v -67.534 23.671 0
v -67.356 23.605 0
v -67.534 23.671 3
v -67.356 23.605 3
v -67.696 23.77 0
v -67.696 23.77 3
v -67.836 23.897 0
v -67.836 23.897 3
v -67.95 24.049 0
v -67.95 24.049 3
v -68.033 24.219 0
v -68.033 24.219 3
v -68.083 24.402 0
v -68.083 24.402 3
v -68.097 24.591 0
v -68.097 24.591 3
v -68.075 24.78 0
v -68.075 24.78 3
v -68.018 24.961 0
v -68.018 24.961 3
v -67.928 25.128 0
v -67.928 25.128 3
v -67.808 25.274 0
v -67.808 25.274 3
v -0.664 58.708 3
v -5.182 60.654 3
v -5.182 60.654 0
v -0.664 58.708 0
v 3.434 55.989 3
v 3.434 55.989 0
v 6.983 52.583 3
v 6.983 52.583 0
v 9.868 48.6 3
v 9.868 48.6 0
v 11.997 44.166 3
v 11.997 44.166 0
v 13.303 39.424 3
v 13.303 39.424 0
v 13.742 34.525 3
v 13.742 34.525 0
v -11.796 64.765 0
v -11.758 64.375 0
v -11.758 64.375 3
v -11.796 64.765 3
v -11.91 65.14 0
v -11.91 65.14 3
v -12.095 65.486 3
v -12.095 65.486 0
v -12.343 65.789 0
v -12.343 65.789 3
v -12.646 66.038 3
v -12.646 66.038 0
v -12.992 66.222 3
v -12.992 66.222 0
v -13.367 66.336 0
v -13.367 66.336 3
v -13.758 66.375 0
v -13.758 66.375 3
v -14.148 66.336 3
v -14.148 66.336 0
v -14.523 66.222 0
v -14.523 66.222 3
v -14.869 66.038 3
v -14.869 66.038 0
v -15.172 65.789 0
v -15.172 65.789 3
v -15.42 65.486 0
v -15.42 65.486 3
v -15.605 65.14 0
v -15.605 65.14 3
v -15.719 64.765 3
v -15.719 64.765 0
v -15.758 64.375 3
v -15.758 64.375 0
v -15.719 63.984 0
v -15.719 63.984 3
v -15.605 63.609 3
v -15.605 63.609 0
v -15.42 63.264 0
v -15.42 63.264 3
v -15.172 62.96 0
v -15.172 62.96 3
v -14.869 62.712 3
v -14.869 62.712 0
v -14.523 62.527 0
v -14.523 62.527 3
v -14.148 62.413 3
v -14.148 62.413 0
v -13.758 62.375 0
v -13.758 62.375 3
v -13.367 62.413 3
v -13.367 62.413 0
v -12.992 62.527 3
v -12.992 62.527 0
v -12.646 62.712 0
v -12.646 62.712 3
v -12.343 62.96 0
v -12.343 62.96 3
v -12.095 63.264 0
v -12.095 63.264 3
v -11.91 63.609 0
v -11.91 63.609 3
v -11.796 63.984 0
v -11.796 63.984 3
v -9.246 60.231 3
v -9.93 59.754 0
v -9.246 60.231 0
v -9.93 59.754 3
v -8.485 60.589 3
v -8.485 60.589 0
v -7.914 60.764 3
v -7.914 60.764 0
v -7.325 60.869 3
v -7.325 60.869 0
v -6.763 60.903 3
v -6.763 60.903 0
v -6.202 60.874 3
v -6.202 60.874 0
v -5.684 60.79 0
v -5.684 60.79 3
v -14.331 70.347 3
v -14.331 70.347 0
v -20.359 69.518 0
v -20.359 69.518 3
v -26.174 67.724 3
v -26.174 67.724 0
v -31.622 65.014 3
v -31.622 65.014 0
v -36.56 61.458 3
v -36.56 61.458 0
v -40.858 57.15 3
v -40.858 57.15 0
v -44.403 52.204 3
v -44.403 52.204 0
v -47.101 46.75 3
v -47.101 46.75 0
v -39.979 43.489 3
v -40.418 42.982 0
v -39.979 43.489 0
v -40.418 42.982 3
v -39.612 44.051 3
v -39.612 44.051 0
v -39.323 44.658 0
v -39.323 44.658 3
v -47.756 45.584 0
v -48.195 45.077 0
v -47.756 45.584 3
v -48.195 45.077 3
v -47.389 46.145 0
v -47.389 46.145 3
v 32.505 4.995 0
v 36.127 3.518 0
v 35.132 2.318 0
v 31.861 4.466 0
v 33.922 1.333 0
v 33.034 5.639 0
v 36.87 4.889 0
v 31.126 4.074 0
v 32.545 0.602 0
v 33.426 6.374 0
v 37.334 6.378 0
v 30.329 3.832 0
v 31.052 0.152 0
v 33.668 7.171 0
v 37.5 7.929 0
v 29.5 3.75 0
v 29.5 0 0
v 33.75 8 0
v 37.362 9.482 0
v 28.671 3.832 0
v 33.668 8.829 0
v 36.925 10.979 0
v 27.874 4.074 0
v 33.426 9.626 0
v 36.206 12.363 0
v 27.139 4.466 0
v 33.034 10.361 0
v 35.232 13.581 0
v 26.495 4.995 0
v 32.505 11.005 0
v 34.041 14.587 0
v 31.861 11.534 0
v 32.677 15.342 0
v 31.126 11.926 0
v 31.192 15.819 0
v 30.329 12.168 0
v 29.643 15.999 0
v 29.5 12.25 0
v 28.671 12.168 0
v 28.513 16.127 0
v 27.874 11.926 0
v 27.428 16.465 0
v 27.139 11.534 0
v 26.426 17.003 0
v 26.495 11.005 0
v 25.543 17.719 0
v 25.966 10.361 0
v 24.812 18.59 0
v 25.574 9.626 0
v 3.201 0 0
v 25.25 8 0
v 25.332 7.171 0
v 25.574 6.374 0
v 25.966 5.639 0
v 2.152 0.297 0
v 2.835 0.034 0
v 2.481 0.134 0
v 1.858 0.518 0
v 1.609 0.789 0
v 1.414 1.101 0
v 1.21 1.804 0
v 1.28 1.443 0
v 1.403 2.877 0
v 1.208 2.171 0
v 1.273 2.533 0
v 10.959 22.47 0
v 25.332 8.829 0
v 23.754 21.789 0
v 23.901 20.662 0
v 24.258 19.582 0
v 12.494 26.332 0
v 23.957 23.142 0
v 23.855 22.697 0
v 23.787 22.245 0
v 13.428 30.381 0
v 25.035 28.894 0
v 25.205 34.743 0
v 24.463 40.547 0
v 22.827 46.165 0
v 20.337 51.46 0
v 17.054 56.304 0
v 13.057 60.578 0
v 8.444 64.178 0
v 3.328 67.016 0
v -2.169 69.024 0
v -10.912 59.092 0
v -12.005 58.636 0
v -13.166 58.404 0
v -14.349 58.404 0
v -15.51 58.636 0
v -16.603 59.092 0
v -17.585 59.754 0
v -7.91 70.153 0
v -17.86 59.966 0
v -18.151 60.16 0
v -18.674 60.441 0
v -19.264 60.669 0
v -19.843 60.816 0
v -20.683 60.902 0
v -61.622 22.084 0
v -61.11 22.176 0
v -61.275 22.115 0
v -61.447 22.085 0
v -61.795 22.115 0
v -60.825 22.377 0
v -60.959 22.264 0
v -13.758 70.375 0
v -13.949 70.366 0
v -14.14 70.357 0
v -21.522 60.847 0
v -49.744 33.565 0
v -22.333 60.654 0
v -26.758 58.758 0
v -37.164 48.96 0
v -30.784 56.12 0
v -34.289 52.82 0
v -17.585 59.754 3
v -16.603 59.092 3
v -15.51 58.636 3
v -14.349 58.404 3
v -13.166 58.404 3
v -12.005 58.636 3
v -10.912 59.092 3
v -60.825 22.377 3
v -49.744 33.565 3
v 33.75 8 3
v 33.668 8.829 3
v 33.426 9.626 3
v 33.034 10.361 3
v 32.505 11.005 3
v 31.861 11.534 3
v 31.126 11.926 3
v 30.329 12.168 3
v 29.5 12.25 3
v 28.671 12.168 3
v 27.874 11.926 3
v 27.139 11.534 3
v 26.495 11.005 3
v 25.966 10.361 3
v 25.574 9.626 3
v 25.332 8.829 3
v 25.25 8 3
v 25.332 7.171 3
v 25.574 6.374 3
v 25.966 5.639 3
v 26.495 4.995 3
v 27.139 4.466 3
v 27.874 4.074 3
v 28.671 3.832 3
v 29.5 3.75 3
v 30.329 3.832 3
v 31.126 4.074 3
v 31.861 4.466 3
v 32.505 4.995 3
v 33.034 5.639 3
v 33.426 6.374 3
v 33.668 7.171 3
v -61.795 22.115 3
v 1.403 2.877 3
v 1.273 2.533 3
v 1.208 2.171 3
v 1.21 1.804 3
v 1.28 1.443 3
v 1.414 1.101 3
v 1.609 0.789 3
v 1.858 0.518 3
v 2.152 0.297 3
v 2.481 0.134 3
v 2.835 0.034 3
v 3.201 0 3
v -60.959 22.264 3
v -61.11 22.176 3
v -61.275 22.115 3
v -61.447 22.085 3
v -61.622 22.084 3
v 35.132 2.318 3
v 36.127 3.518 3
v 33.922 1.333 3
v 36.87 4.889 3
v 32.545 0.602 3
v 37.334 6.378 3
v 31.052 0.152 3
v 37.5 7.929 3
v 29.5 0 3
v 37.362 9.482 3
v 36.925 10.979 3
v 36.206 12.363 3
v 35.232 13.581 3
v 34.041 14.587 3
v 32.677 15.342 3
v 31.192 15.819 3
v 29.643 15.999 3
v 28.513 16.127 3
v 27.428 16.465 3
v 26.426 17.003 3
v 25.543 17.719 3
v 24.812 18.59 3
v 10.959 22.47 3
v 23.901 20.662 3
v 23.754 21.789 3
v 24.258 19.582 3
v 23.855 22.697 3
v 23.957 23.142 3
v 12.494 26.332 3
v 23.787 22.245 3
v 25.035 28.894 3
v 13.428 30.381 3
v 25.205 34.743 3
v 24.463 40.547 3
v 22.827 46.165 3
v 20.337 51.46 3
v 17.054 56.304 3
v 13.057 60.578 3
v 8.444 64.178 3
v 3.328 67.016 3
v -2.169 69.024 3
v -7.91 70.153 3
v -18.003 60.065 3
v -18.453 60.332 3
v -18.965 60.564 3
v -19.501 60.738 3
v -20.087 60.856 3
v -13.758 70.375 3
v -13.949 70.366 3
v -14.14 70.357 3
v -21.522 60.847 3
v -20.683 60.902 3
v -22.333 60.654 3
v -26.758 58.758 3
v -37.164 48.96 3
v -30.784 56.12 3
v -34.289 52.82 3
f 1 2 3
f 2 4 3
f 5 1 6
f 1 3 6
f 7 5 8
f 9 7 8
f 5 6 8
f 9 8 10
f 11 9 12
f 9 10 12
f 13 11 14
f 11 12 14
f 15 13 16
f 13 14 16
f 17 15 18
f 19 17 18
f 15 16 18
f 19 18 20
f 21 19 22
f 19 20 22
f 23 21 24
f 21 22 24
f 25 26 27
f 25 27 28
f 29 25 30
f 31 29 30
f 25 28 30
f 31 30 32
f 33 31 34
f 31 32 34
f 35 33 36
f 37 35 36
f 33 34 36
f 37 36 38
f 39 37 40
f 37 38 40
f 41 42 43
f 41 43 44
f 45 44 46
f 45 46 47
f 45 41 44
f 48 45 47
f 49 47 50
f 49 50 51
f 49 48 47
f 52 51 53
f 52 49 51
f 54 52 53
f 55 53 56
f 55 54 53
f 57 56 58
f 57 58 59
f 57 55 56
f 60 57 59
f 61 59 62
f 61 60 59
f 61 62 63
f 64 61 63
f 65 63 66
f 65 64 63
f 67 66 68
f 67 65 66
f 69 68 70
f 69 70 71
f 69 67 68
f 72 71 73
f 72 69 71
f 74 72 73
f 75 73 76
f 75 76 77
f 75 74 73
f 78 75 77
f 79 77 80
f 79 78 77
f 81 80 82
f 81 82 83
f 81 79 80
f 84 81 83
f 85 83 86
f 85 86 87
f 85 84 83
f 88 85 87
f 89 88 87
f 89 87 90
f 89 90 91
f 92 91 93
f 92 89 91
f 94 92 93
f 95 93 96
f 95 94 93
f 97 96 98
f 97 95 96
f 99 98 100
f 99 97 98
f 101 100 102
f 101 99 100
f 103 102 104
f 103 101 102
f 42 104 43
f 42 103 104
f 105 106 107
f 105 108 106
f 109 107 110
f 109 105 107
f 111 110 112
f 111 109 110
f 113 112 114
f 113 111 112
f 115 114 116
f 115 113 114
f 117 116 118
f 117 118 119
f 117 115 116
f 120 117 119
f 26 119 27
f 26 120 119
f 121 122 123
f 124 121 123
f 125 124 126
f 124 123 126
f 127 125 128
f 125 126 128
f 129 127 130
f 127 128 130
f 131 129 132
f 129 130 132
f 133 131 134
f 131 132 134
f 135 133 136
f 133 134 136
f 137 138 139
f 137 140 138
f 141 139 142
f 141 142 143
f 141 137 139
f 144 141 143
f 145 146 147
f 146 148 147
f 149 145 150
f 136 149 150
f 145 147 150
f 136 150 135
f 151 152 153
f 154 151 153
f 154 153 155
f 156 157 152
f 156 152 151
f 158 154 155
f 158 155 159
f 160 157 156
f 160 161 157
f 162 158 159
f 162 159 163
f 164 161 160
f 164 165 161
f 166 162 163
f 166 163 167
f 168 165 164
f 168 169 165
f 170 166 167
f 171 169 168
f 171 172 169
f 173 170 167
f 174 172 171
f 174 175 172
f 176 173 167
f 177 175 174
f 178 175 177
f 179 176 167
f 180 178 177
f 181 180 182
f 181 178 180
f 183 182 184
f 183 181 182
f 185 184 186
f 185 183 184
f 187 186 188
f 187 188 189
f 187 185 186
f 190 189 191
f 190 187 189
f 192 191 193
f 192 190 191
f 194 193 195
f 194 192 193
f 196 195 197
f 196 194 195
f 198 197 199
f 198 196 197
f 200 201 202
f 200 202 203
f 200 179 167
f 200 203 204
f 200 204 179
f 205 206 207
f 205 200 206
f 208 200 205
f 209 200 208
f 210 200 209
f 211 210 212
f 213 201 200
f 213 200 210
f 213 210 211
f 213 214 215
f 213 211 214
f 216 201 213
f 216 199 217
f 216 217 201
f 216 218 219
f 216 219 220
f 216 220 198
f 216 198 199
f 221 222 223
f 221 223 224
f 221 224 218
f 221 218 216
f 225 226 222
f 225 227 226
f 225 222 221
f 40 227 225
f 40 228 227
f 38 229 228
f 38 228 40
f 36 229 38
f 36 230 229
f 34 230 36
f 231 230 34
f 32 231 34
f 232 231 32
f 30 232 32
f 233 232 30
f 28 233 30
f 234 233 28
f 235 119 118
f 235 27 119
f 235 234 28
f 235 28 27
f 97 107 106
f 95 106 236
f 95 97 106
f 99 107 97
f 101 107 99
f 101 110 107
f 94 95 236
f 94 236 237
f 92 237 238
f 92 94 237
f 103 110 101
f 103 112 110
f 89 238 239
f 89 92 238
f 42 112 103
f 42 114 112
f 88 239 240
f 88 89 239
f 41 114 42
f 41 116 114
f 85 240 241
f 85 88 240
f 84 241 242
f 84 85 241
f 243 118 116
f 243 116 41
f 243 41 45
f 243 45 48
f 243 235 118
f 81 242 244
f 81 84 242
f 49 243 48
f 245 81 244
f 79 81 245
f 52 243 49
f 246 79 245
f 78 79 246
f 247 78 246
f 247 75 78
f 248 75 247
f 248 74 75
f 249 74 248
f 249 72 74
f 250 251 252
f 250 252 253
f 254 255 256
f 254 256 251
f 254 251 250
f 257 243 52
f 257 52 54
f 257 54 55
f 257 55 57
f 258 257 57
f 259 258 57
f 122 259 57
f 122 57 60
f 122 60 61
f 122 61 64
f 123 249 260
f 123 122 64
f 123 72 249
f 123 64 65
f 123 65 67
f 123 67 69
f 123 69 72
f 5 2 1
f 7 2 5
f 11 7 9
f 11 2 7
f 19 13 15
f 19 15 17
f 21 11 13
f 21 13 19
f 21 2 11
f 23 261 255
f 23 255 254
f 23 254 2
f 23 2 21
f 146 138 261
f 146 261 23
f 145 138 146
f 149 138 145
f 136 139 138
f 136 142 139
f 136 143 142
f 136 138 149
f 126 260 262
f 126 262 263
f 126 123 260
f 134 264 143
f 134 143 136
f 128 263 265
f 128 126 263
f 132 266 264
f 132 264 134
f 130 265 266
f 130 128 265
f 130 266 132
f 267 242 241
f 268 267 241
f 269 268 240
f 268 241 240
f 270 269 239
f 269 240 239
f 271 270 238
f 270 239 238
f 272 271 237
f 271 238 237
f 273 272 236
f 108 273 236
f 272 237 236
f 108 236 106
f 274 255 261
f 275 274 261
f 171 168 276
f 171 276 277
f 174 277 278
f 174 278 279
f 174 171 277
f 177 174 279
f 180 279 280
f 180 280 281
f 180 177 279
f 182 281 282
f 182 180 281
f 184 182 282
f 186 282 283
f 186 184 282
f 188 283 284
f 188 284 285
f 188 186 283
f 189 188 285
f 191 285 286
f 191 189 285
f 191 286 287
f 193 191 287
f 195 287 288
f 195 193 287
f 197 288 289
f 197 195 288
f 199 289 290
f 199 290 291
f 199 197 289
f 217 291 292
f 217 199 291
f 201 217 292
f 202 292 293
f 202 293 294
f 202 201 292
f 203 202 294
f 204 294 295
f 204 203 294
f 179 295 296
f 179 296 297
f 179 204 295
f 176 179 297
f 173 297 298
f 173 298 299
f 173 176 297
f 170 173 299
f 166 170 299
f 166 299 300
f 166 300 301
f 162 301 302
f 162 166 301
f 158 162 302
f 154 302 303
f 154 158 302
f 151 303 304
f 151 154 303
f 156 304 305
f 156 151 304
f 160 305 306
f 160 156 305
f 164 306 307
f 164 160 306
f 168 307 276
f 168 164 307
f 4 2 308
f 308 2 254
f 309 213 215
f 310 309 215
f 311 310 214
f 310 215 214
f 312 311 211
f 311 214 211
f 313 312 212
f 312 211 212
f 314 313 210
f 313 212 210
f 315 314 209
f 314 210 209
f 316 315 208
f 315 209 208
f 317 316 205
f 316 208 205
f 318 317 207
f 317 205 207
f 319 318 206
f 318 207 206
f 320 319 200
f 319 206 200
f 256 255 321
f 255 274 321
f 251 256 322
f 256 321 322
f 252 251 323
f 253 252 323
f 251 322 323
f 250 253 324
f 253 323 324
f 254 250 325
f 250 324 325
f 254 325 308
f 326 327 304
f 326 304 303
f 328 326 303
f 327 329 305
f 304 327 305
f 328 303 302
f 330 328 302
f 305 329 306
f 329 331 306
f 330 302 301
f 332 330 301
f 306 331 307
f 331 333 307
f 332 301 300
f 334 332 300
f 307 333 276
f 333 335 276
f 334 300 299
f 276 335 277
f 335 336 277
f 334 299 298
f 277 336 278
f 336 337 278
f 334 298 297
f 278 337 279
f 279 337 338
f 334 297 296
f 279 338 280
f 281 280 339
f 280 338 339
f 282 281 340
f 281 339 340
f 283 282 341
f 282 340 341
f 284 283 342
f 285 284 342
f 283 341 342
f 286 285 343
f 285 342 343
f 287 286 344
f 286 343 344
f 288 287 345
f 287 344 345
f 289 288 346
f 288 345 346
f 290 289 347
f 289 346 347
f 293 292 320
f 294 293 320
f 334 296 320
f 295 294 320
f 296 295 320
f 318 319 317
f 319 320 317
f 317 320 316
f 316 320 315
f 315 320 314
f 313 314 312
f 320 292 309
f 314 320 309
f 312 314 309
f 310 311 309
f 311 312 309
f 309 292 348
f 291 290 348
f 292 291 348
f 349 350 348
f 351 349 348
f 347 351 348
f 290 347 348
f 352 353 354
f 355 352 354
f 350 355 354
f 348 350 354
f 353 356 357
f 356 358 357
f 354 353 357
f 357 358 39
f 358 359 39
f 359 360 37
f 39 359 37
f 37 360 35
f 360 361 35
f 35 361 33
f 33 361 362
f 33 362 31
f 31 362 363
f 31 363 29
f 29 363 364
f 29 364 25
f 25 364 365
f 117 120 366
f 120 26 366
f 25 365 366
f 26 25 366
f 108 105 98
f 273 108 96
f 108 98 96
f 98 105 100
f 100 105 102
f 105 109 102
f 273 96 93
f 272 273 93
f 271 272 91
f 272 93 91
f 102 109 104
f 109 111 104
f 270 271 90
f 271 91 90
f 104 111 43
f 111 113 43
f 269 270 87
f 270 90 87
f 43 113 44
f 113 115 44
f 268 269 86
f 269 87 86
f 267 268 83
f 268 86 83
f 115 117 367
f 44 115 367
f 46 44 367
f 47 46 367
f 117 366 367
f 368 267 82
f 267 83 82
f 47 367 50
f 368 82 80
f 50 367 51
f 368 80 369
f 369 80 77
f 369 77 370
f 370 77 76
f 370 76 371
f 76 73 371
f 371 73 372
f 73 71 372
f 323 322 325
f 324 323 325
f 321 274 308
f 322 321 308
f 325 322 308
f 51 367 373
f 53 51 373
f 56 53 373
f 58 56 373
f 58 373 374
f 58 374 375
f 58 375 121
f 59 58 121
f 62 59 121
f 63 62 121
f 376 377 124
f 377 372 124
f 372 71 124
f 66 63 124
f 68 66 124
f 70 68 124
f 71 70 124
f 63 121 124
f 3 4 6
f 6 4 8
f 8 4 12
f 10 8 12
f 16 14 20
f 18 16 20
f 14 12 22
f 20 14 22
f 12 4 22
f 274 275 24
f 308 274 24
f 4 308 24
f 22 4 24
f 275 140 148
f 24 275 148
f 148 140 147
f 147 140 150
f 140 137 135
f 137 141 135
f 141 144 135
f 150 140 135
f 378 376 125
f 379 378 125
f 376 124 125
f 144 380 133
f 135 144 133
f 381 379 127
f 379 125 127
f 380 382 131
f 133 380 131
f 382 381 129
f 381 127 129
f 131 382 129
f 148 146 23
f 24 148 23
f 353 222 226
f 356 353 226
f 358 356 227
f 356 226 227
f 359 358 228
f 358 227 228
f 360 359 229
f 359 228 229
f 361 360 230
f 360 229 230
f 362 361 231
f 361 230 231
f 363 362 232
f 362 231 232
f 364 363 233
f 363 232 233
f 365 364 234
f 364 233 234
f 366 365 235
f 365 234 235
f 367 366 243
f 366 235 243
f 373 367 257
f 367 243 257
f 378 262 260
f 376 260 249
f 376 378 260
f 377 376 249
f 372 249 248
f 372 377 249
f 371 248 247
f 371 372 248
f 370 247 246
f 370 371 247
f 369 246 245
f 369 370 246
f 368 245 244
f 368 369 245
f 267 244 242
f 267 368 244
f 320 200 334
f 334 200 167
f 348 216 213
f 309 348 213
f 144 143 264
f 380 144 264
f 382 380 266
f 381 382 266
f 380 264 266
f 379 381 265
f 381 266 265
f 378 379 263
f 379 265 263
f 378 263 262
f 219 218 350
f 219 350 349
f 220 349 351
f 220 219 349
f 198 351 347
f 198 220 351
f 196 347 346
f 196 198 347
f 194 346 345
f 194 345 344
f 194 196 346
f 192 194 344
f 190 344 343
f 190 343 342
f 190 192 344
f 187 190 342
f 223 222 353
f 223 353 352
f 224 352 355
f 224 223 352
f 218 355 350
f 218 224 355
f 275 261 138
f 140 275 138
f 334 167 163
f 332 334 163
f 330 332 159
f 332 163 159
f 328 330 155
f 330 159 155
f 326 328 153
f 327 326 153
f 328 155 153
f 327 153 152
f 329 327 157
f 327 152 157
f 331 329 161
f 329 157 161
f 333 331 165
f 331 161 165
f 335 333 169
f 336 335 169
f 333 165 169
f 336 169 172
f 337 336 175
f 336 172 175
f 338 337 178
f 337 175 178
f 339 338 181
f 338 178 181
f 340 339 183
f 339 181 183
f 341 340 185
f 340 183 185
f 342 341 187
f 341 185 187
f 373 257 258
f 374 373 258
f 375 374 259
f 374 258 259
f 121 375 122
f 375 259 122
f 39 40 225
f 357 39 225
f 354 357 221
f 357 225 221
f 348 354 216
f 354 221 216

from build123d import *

# Parameters (mm, degrees)
F0_R        = 2
F0_R_2      = 4.25
F1_DEPTH    = 3
F2_R        = 5
F3_T1_DEPTH = 3
F4_R        = 1


# Not quite as in the source:
# - a fillet or chamfer that OpenCascade refuses, or shapes differently, is made with other operations: its cross-section is extruded or revolved along the edge and cut away or added


with BuildPart() as f1:
    # F0 (on Top) → F1 (new body)
    with BuildSketch(Plane.XY):
        with BuildLine():
            Line((-61.2338289806, 21.9643939736), (-49.74418384, 33.565422262))
            ThreePointArc((-49.74418384, 33.565422262), (-49.1122742467, 39.7914012722), (-47.4538011201, 45.8256030636))
            Line((-47.4538011201, 45.8256030636), (-69.0197217506, 24.0506176536))
            Line((-69.0197217506, 24.0506176536), (-61.2338289806, 21.9643939736))
        make_face()
        with BuildLine():
            ThreePointArc((-47.4538011201, 45.8256030636), (-49.1122742467, 39.7914012722), (-49.74418384, 33.565422262))
            Line((-49.74418384, 33.565422262), (-39.66790835, 43.7393793835))
            ThreePointArc((-39.66790835, 43.7393793835), (-31.7050161187, 55.3610537789), (-19.0319758246, 61.5145095676))
            ThreePointArc((-19.0319758246, 61.5145095676), (-19.0541360585, 67.1935796255), (-14.3311022775, 70.3471933782))
            ThreePointArc((-14.3311022775, 70.3471933782), (-34.5629581909, 63.0443589232), (-47.4538011201, 45.8256030636))
        make_face()
        with BuildLine():
            ThreePointArc((-13.7575576035, 70.3746690788), (-14.04438253, 70.3620290137), (-14.3311022775, 70.3471933782))
            ThreePointArc((-14.3311022775, 70.3471933782), (-19.0541360585, 67.1935796255), (-19.0319758246, 61.5145095676))
            ThreePointArc((-19.0319758246, 61.5145095676), (-13.7575576035, 62.0250576942), (-8.4831393824, 61.5145095676))
            ThreePointArc((-8.4831393824, 61.5145095676), (-7.941781244, 62.8992893525), (-7.7575576035, 64.3746690788))
            ThreePointArc((-7.7575576035, 64.3746690788), (-9.5149169164, 68.6173097659), (-13.7575576035, 70.3746690788))
        make_face()
        with Locations((-13.7575576035, 64.3746690788)):
            Circle(F0_R, mode=Mode.SUBTRACT)
        with BuildLine():
            ThreePointArc((-8.4831393824, 61.5145095676), (-13.7575576035, 62.0250576942), (-19.0319758246, 61.5145095676))
            ThreePointArc((-19.0319758246, 61.5145095676), (-13.7575576035, 58.3746690788), (-8.4831393824, 61.5145095676))
        make_face()
        with BuildLine():
            ThreePointArc((1.4030809655, 2.8767422936), (1.5045728658, 0.9401614715), (3.2006690581, 0))
            Line((3.2006690581, 0), (5.7364393854, 0))
            ThreePointArc((5.7364393854, 0), (16.9754981283, 9.4077450038), (23.75, 22.4049843981))
            ThreePointArc((23.75, 22.4049843981), (24.8731060123, 27.6016835392), (25.25, 32.9049843981))
            ThreePointArc((25.25, 32.9049843981), (13.7280348551, 59.9492389647), (-13.7575576035, 70.3746690788))
            ThreePointArc((-13.7575576035, 70.3746690788), (-9.5149169164, 68.6173097659), (-7.7575576035, 64.3746690788))
            ThreePointArc((-7.7575576035, 64.3746690788), (-7.941781244, 62.8992893525), (-8.4831393824, 61.5145095676))
            ThreePointArc((-8.4831393824, 61.5145095676), (7.4709197451, 52.0065264385), (13.7424423965, 34.5250576942))
            ThreePointArc((13.7424423965, 34.5250576942), (13.0376191781, 28.3389036997), (10.9592786697, 22.4698511575))
            Line((10.9592786697, 22.4698511575), (1.4030809655, 2.8767422936))
        make_face()
        with BuildLine():
            ThreePointArc((23.75, 22.4049843981), (16.9754981283, 9.4077450038), (5.7364393854, 0))
            Line((5.7364393854, 0), (29.5, 0))
            ThreePointArc((29.5, 0), (37.5, 8), (29.5, 16))
            Line((29.5, 16), (23.75, 16))
            Line((23.75, 16), (23.75, 22.4049843981))
        make_face()
        with Locations((29.5, 8)):
            Circle(F0_R_2, mode=Mode.SUBTRACT)
    extrude(amount=F1_DEPTH)

    # F2
    f2_edges = [f1.edges().sort_by_distance(p)[0] for p in [
        (-19.031976, 61.51451, 1.5),
        (-8.483139, 61.51451, 1.5),
        (-39.667908, 43.739379, 1.5),
        (-47.453801, 45.825603, 1.5),
    ]]
    fillet(f2_edges, radius=F2_R)

    # F3: fillet of radius 6 on 2 edges, made by hand

    # F3_s2 → F3_t1 (join)
    with BuildSketch(Plane.XY):
        with BuildLine():
            ThreePointArc((23.9568965517, 23.1422674559), (23.8019490297, 22.3680713423), (23.75, 21.5802327452))
            Line((23.75, 21.5802327452), (23.75, 22.4049843981))
            ThreePointArc((23.75, 22.4049843981), (23.8553302711, 22.773097801), (23.9568965517, 23.1422674559))
        make_face()
        with BuildLine():
            ThreePointArc((23.75, 21.9977676792), (25.4696462095, 17.7931783498), (29.6428571429, 15.9987243881))
            Line((29.6428571429, 15.9987243881), (29.6321428571, 15.398820059))
            ThreePointArc((29.6321428571, 15.398820059), (29.5, 15.4), (23.75, 15.4))
            Line((23.75, 15.4), (23.15, 16))
            Line((23.15, 16), (23.15, 21.9977676792))
            Line((23.15, 21.9977676792), (23.75, 21.9977676792))
        make_face()
    extrude(amount=F3_T1_DEPTH)

    # F4
    f4_edges = [f1.edges().sort_by_distance(p)[0] for p in [
        (-69.019722, 24.050618, 1.5),
        (-61.233829, 21.964394, 1.5),
    ]]
    fillet(f4_edges, radius=F4_R)


solid = f1.part
